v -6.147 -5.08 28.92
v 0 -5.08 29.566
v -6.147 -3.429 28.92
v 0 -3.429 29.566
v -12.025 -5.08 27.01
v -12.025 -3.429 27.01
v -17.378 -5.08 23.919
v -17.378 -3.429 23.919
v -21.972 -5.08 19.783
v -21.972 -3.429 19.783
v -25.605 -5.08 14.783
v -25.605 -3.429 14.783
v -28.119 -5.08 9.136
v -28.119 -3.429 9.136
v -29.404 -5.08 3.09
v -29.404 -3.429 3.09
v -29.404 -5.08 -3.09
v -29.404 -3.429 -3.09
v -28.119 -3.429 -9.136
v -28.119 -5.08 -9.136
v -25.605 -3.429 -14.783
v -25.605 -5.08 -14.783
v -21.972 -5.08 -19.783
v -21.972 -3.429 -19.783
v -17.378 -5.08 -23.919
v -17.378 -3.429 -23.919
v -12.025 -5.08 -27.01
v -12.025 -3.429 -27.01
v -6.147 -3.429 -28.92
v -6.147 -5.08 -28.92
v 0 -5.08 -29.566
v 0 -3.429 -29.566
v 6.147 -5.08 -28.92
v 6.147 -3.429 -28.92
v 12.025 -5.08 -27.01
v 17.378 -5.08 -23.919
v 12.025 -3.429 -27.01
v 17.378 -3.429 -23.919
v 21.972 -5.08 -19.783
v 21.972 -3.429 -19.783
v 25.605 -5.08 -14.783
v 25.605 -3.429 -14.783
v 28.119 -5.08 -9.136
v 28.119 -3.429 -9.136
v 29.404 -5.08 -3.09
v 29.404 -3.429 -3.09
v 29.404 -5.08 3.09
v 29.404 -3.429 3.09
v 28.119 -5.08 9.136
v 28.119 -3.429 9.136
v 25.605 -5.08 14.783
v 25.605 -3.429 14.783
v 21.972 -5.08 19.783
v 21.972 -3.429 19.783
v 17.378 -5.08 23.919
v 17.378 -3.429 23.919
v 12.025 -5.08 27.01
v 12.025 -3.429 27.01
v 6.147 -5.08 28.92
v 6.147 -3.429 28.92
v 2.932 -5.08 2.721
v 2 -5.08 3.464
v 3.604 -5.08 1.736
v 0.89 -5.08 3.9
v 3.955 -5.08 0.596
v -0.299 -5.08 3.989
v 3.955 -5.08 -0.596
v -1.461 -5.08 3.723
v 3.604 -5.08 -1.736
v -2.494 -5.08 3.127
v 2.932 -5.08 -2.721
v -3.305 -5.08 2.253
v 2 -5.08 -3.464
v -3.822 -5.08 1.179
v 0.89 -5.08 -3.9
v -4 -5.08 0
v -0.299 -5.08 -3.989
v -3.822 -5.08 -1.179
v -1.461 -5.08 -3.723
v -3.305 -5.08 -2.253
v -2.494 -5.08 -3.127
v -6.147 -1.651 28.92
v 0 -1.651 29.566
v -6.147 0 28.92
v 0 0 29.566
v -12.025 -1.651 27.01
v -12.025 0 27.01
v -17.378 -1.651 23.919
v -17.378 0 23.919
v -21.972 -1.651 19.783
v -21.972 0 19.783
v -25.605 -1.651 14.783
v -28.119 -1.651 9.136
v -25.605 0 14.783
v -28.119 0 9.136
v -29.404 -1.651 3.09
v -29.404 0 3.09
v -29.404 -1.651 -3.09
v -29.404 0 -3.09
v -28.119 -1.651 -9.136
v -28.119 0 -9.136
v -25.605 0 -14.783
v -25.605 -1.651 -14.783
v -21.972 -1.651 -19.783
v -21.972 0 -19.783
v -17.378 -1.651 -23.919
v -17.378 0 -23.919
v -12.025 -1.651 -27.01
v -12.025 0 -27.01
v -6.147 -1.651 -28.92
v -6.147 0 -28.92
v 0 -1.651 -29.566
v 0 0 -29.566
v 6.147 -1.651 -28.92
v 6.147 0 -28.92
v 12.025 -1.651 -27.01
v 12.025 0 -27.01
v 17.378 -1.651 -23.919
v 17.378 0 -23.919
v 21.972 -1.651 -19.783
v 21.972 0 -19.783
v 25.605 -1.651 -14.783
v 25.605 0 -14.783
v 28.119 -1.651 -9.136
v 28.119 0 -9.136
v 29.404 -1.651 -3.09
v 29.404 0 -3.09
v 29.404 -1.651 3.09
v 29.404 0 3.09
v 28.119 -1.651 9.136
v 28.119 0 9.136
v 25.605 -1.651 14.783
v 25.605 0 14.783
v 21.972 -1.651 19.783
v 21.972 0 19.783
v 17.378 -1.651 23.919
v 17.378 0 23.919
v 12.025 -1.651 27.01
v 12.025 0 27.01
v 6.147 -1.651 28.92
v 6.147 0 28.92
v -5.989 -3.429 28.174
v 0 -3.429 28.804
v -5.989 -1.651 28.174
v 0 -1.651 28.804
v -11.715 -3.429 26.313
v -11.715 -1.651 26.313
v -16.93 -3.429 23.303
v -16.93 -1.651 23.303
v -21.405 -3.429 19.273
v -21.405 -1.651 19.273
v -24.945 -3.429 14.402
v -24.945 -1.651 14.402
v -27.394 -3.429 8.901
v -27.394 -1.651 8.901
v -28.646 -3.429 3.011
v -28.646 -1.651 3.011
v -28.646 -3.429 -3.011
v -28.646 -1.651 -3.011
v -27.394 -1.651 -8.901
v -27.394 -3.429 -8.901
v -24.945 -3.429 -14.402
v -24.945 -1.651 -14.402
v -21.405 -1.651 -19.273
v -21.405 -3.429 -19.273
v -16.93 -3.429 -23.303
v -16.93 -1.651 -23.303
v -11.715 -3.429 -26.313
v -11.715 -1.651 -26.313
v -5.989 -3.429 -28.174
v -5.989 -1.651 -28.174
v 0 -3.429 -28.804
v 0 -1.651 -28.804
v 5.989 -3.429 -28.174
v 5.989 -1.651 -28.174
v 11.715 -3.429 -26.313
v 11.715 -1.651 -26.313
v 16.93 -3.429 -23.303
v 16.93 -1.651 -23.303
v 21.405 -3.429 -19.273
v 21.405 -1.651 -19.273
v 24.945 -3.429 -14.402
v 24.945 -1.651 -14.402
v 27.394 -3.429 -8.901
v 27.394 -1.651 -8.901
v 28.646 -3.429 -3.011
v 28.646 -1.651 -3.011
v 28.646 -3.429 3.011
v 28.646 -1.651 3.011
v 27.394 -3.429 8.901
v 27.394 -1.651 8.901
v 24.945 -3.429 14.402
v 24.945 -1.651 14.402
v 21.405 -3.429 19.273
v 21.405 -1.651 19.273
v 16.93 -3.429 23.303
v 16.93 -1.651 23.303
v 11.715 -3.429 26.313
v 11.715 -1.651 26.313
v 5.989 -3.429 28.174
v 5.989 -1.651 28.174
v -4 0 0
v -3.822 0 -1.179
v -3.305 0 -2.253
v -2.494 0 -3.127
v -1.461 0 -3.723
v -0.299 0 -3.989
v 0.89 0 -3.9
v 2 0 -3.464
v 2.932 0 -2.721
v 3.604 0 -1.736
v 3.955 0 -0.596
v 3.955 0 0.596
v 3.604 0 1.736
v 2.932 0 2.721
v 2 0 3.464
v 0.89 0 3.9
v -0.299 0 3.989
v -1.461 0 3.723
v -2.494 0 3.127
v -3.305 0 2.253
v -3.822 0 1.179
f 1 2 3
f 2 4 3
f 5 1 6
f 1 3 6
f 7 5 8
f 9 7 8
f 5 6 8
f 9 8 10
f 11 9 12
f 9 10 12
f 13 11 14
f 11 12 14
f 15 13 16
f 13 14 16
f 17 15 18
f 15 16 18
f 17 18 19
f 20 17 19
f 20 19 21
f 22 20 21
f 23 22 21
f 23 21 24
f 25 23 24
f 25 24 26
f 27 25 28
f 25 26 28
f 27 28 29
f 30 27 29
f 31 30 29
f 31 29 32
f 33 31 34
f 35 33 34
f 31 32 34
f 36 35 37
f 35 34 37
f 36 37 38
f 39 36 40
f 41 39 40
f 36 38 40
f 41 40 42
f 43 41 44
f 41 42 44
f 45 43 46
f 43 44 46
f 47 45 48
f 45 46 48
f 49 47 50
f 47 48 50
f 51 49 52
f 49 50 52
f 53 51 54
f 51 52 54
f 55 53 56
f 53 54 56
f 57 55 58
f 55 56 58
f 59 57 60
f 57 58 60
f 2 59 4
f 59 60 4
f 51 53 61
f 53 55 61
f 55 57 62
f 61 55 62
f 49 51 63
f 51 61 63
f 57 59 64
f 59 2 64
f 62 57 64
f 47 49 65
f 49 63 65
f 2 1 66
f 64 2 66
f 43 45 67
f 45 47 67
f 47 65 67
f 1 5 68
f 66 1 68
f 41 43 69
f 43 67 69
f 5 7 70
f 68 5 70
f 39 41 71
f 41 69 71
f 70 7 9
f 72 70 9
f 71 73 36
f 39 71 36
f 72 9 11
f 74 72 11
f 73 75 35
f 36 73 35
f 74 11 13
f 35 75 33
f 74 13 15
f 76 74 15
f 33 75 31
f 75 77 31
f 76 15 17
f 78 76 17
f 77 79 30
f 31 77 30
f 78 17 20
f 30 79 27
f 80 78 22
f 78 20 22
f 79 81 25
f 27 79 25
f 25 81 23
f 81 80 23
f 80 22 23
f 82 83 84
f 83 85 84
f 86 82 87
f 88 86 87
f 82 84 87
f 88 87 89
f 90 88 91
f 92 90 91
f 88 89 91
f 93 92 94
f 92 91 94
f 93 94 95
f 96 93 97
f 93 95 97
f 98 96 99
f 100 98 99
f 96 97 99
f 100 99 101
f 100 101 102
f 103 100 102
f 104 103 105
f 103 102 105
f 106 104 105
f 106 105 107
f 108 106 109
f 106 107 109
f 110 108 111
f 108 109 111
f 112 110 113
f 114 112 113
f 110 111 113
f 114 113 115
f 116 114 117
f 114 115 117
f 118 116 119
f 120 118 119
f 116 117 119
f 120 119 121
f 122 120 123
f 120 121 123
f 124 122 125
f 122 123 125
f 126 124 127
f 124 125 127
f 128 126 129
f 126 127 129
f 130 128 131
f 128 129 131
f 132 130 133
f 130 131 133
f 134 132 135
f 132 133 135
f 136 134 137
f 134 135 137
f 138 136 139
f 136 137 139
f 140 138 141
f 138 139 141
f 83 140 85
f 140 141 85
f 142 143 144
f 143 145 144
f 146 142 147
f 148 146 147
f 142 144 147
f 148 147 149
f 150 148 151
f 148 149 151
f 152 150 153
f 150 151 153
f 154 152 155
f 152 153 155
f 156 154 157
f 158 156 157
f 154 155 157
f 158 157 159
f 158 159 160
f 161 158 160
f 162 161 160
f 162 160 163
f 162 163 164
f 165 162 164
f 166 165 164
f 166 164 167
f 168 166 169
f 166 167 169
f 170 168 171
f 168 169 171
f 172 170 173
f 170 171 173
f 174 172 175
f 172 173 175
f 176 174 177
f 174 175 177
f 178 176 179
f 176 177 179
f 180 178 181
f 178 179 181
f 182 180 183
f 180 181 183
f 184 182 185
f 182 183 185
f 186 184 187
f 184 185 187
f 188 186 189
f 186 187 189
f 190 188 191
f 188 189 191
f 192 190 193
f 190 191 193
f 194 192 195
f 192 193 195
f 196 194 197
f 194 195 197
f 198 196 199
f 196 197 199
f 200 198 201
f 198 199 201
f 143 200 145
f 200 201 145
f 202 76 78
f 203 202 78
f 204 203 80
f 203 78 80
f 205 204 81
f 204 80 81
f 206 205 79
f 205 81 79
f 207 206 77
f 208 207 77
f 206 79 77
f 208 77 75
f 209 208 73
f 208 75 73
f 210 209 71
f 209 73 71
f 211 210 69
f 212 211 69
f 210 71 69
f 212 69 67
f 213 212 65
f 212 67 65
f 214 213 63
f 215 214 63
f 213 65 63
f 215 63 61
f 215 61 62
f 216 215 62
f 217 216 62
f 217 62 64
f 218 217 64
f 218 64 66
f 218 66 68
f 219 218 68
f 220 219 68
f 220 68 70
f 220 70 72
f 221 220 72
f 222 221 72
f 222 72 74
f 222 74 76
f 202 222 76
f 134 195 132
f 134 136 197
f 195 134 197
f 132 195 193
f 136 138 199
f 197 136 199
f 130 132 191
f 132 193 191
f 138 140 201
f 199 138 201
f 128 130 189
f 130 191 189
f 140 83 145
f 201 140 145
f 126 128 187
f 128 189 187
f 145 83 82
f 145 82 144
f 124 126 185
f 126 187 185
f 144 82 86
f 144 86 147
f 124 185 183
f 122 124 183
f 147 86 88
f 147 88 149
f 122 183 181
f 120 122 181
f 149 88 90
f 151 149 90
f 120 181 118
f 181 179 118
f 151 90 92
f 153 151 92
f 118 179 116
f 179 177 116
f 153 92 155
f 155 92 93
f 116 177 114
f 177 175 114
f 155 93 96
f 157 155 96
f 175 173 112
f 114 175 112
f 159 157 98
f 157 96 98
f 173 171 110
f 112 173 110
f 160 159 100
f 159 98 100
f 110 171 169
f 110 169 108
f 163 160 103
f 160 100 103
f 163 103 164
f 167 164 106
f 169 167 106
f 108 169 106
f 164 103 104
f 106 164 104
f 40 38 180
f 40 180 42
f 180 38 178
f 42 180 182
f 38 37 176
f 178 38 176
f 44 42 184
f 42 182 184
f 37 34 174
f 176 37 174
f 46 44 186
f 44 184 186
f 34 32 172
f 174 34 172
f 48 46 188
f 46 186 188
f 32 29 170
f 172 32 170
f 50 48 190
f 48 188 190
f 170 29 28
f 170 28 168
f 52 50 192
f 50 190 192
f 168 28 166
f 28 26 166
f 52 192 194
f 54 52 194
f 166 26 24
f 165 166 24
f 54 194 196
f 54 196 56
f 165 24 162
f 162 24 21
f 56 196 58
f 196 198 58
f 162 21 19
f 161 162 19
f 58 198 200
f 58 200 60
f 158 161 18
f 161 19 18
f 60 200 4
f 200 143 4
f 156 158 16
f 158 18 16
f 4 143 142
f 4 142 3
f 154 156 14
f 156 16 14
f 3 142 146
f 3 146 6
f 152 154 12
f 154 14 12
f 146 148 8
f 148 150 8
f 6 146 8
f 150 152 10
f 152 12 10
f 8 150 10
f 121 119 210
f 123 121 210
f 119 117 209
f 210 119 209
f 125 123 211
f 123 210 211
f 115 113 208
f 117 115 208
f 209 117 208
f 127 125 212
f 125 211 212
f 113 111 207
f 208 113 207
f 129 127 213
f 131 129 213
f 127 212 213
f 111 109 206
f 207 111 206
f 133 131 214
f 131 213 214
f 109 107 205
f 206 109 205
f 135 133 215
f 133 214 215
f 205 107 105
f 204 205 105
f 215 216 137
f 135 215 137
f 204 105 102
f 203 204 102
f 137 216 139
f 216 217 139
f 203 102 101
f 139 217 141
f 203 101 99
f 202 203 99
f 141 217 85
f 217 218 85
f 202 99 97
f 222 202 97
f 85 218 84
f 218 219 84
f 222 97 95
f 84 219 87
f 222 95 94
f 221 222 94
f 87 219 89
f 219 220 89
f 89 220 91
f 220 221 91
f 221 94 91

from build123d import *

# Parameters (mm, degrees)
F_8_0MM_DOWEL_HOLE1_D = 8


with BuildPart() as part:
    # Sketch1 → Revolve1 (revolve)
    with BuildSketch(Plane(origin=(0, 0, 0), x_dir=(0, 0, -1), z_dir=(1, 0, 0))):
        Polygon((0, 0), (0, -5.08), (-29.5656, -5.08), (-29.5656, -3.429), (-28.8036, -3.429), (-28.8036, -1.651), (-29.5656, -1.651), (-29.5656, 0), align=None)
    revolve(axis=Axis((0, 0, 0), (0, -1, 0)))

    # Ø8.0mm Dowel Hole1 (through all)
    with Locations(Plane(origin=(0, 0, 0), x_dir=(1, 0, 0), z_dir=(0, 1, 0))):
        with Locations((0, 0)):
            Hole(F_8_0MM_DOWEL_HOLE1_D / 2)


solid = part.part
